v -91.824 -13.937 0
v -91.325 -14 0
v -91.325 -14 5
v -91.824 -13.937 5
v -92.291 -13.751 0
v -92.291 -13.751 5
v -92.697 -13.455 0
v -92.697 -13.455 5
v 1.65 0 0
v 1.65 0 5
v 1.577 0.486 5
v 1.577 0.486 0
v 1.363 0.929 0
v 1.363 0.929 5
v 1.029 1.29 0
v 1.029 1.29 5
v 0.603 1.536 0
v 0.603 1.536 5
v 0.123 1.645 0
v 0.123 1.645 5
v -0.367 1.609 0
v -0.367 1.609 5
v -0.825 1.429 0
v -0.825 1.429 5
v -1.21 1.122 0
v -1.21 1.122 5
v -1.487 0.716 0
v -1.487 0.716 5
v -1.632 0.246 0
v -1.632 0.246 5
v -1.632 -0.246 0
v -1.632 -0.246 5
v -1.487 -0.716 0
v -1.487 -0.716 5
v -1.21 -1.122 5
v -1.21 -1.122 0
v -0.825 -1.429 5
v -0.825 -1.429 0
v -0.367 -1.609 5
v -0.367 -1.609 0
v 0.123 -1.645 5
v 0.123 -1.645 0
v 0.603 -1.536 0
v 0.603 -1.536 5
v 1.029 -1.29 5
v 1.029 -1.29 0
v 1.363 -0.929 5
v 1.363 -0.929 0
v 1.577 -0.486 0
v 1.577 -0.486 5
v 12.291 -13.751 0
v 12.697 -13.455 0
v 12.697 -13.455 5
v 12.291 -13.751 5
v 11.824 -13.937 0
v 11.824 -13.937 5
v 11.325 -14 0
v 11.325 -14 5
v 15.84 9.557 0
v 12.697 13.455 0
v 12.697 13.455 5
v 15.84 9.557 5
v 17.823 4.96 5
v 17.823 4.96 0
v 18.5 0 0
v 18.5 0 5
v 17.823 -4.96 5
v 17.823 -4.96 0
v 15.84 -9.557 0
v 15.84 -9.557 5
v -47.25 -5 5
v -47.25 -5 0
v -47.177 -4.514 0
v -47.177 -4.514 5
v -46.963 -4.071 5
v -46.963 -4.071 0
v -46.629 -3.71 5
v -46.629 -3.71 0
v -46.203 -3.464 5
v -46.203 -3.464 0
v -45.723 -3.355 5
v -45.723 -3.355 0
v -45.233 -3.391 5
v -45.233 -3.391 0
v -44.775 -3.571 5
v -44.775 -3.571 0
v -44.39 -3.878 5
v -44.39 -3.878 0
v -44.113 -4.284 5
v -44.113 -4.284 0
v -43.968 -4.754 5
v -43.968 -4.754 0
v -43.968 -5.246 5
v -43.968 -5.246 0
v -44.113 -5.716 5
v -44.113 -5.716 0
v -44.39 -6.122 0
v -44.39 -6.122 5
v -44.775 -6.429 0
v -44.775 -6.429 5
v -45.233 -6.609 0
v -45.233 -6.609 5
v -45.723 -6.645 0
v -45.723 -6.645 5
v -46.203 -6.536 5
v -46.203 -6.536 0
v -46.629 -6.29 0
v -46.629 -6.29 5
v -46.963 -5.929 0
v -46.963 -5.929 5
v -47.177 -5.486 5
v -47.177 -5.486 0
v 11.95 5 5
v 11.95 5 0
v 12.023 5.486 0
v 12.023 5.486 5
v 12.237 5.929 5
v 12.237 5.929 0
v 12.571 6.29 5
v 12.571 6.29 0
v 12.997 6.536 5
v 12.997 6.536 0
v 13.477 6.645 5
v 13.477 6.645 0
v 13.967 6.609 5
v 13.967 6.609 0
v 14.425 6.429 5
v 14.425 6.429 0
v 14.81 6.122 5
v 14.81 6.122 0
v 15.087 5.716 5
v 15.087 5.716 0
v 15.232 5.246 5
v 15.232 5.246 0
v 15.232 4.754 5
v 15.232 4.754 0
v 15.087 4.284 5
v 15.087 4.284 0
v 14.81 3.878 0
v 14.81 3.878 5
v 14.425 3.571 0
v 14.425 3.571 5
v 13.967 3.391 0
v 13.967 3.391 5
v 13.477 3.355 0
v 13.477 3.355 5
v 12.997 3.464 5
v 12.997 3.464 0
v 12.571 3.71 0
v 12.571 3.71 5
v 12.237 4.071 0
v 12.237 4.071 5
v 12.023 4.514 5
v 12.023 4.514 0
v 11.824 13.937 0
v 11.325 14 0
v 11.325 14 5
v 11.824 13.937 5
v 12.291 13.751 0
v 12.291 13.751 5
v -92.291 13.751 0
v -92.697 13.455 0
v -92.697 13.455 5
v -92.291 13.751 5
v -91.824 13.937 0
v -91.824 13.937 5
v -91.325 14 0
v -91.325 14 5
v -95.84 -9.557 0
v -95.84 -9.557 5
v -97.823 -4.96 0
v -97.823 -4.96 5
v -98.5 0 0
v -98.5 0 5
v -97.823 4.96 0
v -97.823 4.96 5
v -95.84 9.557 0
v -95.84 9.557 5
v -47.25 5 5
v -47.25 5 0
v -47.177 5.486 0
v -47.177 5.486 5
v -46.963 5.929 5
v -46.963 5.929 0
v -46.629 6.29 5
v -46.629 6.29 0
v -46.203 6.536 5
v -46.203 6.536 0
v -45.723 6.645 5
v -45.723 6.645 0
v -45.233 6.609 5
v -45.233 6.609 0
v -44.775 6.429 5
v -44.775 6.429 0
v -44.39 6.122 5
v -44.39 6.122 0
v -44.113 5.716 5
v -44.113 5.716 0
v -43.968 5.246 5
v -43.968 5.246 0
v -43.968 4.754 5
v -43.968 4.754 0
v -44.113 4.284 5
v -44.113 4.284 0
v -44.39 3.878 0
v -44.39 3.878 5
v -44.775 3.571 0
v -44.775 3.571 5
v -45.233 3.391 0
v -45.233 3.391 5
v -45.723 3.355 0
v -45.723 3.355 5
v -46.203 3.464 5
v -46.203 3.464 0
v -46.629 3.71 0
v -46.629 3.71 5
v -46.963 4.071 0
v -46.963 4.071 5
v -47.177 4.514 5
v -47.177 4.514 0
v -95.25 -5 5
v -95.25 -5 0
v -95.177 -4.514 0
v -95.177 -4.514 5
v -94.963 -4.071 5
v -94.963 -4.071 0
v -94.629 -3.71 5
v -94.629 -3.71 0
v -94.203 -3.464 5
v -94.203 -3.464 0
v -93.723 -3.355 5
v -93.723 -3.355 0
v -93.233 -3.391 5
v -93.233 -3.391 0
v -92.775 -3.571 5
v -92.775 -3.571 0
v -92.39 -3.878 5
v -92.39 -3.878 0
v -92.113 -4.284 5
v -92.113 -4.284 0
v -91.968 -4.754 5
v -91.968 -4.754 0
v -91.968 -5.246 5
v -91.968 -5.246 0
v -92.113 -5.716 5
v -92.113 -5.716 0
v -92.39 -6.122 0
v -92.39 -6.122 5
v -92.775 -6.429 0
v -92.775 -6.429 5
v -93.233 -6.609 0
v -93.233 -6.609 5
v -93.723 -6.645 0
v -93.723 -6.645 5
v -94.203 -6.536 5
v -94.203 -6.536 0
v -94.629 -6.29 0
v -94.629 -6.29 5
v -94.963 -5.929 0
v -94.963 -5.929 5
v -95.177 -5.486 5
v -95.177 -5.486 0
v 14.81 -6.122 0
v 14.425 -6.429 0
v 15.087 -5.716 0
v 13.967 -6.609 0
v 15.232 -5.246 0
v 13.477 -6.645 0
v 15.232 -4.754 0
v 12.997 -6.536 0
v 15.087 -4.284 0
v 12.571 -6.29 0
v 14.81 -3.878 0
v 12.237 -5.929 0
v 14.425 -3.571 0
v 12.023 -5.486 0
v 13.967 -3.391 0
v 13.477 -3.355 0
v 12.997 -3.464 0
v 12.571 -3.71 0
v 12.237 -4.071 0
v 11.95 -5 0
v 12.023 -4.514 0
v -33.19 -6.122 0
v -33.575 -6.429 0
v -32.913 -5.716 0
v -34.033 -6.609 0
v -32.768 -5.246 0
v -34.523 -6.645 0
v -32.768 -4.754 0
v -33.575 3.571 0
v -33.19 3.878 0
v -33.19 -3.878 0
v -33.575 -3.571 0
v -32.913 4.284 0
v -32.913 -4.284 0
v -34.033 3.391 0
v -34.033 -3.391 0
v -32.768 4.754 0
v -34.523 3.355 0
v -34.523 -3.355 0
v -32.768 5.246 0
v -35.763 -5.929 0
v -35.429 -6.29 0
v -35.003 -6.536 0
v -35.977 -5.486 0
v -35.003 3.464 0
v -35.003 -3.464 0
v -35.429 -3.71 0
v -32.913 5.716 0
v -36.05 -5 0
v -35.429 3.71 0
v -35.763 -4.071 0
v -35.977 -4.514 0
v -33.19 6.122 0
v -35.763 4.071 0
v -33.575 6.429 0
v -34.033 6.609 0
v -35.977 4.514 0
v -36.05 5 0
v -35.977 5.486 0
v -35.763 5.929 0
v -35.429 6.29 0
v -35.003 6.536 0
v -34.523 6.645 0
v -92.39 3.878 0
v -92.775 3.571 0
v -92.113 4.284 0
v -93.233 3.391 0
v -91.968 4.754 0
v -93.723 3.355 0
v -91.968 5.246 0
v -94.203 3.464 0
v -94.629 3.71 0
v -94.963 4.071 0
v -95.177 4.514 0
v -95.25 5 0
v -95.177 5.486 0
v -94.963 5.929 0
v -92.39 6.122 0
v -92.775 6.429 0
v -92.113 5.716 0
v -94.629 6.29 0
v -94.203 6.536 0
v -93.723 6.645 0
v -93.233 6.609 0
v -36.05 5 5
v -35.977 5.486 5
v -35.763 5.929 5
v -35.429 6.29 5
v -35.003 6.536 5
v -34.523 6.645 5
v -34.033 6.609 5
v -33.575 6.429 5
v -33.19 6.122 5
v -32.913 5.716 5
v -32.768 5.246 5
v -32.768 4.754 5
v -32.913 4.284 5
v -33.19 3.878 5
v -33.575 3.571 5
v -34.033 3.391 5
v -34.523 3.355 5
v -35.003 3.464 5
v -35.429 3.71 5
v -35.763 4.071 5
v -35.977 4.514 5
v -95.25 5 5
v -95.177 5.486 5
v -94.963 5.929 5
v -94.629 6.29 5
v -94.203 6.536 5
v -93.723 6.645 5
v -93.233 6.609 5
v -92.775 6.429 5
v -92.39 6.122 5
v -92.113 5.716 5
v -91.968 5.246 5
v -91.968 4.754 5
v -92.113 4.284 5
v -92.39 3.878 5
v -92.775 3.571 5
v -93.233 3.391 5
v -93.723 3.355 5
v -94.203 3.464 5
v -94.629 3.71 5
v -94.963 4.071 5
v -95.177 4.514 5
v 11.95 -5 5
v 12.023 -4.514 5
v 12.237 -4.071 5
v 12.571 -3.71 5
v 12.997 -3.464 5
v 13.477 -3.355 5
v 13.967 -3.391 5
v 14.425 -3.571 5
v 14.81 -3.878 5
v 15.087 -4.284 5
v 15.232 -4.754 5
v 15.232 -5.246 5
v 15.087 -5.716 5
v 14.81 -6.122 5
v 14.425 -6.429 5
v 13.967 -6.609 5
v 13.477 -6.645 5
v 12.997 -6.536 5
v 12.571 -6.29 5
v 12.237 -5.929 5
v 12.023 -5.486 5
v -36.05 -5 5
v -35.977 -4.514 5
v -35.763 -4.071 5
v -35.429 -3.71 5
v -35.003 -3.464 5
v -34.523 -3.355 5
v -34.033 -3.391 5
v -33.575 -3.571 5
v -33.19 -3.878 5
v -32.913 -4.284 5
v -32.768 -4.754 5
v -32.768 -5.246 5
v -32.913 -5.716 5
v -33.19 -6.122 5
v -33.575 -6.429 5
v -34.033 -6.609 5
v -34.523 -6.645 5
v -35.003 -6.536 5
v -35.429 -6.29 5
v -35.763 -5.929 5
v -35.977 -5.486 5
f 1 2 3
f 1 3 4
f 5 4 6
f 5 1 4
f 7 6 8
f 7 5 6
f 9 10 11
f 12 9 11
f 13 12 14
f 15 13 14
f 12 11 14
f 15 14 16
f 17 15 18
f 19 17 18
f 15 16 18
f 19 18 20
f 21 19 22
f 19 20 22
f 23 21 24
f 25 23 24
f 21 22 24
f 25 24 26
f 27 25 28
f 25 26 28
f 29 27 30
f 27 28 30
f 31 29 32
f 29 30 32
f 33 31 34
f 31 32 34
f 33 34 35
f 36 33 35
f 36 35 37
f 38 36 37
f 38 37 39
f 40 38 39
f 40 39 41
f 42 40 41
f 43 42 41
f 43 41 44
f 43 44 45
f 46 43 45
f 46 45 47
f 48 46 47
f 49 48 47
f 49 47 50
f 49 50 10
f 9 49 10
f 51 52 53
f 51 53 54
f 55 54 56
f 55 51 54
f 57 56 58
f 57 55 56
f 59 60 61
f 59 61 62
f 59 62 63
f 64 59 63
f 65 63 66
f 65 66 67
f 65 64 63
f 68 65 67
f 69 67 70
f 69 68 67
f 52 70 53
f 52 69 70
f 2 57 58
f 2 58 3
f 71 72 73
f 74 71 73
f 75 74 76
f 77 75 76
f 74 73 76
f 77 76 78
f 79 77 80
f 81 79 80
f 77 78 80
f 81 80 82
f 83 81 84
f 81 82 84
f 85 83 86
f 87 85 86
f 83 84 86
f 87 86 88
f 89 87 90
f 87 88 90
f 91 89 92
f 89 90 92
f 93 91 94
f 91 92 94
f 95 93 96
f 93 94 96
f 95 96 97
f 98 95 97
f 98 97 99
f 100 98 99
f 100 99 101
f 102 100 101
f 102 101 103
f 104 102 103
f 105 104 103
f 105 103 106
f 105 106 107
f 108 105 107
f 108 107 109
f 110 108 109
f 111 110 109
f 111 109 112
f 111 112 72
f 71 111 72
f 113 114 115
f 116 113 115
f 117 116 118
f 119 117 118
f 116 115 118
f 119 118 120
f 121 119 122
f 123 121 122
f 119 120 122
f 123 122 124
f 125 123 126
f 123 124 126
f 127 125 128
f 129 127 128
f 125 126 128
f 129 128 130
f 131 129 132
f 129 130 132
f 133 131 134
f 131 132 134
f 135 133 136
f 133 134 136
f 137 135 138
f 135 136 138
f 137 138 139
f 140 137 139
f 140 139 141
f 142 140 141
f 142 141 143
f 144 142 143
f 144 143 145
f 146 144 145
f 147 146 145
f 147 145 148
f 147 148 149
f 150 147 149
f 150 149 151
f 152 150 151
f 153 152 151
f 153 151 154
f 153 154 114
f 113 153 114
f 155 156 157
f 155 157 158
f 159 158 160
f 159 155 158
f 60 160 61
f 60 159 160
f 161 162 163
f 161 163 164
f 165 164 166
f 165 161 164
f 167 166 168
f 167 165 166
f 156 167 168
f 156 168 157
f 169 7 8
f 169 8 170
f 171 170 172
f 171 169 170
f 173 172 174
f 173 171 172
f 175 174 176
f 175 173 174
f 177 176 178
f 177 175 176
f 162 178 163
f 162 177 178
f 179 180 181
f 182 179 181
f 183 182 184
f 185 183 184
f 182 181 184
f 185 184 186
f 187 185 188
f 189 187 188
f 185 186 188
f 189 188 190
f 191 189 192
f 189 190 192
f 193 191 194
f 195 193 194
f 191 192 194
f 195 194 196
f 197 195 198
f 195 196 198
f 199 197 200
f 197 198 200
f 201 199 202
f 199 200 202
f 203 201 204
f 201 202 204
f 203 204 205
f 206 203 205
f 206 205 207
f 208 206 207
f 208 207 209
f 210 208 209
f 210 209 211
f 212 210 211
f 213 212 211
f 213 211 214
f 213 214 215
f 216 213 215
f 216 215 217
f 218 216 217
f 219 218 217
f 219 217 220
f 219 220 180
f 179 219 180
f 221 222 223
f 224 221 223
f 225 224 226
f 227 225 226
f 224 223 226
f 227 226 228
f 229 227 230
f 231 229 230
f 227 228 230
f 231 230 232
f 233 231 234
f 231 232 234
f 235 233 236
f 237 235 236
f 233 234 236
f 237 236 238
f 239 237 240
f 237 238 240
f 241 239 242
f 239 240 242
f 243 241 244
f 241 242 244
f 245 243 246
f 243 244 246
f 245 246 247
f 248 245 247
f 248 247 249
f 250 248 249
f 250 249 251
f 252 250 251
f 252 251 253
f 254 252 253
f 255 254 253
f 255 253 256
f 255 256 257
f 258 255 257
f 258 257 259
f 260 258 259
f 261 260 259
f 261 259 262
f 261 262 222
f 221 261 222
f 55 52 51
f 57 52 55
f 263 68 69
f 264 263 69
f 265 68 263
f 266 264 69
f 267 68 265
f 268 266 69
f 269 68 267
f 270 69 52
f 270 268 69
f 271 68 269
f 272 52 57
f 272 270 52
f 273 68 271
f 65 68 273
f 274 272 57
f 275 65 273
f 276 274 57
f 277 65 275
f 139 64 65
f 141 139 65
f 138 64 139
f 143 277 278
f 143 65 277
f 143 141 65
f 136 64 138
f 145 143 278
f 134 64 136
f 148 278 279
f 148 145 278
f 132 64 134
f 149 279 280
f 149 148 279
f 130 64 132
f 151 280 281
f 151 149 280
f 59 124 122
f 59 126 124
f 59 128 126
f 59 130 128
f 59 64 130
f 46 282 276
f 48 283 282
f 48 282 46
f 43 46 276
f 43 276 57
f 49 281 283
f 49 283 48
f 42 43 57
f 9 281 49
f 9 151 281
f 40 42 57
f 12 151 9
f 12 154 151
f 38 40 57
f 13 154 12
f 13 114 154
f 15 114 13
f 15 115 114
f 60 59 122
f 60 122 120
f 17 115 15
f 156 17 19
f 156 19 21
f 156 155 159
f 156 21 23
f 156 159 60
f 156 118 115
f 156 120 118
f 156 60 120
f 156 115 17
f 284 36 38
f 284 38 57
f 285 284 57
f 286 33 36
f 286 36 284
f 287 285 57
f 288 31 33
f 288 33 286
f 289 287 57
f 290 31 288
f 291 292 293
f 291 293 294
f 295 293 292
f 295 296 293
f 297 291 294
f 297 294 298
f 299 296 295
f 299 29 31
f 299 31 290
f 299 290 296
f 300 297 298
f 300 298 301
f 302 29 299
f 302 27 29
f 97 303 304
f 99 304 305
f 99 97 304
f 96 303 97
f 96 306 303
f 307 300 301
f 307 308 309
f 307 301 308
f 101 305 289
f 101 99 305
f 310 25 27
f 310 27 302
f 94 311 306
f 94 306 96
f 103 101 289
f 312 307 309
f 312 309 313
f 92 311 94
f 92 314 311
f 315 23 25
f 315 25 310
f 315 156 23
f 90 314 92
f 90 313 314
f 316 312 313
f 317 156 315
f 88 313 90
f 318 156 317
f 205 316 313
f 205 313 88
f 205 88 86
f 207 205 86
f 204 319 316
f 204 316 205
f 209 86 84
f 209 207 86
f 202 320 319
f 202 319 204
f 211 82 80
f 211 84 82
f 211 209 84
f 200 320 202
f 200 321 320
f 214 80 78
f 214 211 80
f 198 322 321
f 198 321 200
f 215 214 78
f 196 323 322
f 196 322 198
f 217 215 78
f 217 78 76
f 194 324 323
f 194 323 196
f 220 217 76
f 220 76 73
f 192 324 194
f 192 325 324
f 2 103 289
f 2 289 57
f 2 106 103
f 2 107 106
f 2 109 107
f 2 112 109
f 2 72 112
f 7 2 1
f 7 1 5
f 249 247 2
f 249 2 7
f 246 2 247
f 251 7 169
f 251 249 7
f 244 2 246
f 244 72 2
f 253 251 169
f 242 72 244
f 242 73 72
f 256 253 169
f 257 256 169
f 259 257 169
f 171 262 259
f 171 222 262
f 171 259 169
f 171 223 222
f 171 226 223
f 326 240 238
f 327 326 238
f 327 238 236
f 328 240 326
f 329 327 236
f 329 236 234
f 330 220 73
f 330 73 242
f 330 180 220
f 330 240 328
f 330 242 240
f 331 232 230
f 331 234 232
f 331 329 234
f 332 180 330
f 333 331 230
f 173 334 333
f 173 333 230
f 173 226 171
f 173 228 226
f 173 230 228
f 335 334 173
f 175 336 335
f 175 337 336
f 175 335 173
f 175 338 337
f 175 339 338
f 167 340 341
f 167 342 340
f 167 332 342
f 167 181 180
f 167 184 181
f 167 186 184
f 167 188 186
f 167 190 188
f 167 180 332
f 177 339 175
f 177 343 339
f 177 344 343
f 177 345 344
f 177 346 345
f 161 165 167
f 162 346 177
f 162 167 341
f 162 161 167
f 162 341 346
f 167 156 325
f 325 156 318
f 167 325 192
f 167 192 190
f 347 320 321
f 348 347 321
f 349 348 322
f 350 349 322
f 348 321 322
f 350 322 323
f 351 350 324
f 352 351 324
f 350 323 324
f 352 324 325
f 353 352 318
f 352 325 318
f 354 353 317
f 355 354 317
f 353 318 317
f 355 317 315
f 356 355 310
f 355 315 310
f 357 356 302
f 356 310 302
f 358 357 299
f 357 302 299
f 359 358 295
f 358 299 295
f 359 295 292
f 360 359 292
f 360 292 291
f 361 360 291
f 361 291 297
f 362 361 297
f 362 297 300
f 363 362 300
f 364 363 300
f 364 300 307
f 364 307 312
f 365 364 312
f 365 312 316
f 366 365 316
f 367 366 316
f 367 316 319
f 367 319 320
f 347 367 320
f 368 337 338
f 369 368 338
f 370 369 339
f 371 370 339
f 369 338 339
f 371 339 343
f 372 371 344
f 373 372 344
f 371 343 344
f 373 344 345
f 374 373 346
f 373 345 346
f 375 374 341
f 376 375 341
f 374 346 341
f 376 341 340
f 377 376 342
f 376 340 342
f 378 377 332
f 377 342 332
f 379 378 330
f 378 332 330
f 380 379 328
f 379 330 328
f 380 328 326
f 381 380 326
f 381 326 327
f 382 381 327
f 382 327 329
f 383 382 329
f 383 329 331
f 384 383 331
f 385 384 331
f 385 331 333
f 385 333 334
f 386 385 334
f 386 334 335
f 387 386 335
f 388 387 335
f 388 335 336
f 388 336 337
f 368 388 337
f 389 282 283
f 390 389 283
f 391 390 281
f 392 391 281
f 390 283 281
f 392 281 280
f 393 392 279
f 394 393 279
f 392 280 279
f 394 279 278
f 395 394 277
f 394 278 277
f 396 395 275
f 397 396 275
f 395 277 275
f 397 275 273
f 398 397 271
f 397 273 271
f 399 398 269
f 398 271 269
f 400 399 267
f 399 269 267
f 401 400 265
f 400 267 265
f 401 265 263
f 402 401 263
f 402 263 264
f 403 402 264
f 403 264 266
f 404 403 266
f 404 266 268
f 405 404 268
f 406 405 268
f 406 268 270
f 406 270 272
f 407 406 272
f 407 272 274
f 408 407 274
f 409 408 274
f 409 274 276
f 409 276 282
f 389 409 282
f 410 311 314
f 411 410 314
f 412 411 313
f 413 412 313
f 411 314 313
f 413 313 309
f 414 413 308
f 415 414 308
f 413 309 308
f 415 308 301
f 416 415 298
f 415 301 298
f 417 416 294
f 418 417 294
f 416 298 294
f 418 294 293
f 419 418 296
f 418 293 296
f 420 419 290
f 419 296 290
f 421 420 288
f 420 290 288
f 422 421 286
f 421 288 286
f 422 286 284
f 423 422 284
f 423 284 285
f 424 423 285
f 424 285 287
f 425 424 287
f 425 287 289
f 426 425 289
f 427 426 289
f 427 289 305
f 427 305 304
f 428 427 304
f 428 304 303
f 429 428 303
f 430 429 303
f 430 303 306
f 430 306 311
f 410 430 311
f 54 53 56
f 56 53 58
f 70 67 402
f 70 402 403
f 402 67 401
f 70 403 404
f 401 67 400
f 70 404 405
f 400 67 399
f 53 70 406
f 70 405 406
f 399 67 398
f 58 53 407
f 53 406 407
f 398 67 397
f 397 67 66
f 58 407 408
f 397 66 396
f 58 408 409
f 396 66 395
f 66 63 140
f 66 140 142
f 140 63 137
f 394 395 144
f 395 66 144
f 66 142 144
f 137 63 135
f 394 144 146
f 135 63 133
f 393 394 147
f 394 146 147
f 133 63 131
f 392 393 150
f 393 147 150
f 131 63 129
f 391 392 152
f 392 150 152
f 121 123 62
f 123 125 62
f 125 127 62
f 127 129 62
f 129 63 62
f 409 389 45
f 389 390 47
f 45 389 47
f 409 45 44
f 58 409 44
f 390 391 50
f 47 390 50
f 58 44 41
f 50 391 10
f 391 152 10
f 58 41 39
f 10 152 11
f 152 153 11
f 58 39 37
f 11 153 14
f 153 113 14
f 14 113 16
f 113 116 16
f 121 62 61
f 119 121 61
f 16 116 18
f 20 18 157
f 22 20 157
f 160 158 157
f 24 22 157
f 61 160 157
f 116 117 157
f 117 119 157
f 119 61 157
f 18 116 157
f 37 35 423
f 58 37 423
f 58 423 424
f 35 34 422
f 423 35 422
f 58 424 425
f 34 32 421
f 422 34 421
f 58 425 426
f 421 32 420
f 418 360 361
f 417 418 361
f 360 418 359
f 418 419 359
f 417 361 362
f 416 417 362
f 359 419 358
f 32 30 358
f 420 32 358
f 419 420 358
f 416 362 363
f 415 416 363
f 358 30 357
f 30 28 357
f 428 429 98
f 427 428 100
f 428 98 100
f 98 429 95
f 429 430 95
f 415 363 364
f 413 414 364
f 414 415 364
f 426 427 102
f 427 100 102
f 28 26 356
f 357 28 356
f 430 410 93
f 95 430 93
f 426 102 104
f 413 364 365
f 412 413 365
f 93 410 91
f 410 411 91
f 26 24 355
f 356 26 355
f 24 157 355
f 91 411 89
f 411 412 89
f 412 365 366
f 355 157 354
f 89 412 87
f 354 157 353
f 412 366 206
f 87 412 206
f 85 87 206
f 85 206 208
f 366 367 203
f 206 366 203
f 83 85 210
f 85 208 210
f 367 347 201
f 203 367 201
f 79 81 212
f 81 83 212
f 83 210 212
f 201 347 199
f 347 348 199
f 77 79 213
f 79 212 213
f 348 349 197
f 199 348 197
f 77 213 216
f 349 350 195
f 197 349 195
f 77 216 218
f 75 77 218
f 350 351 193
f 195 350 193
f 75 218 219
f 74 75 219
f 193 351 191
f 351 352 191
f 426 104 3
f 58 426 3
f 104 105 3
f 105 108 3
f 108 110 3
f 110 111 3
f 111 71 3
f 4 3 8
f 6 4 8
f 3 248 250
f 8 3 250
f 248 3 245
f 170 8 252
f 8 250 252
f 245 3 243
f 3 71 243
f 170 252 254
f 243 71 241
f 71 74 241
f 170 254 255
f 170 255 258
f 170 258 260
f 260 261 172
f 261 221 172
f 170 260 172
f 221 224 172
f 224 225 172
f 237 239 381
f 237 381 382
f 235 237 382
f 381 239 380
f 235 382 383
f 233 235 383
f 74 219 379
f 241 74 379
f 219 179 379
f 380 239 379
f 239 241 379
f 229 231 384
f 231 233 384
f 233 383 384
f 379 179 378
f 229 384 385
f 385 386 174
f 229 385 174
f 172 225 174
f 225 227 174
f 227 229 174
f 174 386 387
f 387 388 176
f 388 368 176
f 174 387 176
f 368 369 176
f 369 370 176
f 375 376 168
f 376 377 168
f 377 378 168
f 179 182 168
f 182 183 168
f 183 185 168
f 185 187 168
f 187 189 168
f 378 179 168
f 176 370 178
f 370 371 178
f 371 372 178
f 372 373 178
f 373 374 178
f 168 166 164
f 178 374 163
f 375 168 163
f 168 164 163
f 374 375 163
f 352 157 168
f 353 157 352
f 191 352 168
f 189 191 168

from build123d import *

# Parameters (mm, degrees)
EXTRUSION1_DEPTH      = 5
TROU_TARAUD_M3X0_51_D = 3.3
TROU_TARAUD_M4X0_71_D = 3.3


with BuildPart() as part:
    # Esquisse1 → Extrusion1 (new body)
    with BuildSketch(Plane.XY):
        with BuildLine():
            Line((11.324751653, -14), (-91.324751653, -14))
            ThreePointArc((-91.324751653, -14), (-92.063300599, -13.858640755), (-92.697448823, -13.454545455))
            ThreePointArc((-92.697448823, -13.454545455), (-98.5, 0), (-92.697448823, 13.454545455))
            ThreePointArc((-92.697448823, 13.454545455), (-92.063300599, 13.858640755), (-91.324751653, 14))
            Line((-91.324751653, 14), (11.324751653, 14))
            ThreePointArc((11.324751653, 14), (12.063300599, 13.858640755), (12.697448823, 13.454545455))
            ThreePointArc((12.697448823, 13.454545455), (18.5, 0), (12.697448823, -13.454545455))
            ThreePointArc((12.697448823, -13.454545455), (12.063300599, -13.858640755), (11.324751653, -14))
        make_face()
    extrude(amount=EXTRUSION1_DEPTH)

    # Trou taraudé M3x0.51 (through all)
    with Locations(Plane.XY.offset(5)):
        with Locations((-93.6, -5), (-93.6, 5), (-45.6, -5), (-45.6, 5), (-34.4, -5), (-34.4, 5), (13.6, -5), (13.6, 5)):
            Hole(TROU_TARAUD_M3X0_51_D / 2)

    # Trou taraudé M4x0.71 (through all)
    with Locations(Plane(origin=(0, 0, 0), x_dir=(-1, 0, 0), z_dir=(0, 0, -1))):
        with Locations((0, 0)):
            Hole(TROU_TARAUD_M4X0_71_D / 2)


solid = part.part
